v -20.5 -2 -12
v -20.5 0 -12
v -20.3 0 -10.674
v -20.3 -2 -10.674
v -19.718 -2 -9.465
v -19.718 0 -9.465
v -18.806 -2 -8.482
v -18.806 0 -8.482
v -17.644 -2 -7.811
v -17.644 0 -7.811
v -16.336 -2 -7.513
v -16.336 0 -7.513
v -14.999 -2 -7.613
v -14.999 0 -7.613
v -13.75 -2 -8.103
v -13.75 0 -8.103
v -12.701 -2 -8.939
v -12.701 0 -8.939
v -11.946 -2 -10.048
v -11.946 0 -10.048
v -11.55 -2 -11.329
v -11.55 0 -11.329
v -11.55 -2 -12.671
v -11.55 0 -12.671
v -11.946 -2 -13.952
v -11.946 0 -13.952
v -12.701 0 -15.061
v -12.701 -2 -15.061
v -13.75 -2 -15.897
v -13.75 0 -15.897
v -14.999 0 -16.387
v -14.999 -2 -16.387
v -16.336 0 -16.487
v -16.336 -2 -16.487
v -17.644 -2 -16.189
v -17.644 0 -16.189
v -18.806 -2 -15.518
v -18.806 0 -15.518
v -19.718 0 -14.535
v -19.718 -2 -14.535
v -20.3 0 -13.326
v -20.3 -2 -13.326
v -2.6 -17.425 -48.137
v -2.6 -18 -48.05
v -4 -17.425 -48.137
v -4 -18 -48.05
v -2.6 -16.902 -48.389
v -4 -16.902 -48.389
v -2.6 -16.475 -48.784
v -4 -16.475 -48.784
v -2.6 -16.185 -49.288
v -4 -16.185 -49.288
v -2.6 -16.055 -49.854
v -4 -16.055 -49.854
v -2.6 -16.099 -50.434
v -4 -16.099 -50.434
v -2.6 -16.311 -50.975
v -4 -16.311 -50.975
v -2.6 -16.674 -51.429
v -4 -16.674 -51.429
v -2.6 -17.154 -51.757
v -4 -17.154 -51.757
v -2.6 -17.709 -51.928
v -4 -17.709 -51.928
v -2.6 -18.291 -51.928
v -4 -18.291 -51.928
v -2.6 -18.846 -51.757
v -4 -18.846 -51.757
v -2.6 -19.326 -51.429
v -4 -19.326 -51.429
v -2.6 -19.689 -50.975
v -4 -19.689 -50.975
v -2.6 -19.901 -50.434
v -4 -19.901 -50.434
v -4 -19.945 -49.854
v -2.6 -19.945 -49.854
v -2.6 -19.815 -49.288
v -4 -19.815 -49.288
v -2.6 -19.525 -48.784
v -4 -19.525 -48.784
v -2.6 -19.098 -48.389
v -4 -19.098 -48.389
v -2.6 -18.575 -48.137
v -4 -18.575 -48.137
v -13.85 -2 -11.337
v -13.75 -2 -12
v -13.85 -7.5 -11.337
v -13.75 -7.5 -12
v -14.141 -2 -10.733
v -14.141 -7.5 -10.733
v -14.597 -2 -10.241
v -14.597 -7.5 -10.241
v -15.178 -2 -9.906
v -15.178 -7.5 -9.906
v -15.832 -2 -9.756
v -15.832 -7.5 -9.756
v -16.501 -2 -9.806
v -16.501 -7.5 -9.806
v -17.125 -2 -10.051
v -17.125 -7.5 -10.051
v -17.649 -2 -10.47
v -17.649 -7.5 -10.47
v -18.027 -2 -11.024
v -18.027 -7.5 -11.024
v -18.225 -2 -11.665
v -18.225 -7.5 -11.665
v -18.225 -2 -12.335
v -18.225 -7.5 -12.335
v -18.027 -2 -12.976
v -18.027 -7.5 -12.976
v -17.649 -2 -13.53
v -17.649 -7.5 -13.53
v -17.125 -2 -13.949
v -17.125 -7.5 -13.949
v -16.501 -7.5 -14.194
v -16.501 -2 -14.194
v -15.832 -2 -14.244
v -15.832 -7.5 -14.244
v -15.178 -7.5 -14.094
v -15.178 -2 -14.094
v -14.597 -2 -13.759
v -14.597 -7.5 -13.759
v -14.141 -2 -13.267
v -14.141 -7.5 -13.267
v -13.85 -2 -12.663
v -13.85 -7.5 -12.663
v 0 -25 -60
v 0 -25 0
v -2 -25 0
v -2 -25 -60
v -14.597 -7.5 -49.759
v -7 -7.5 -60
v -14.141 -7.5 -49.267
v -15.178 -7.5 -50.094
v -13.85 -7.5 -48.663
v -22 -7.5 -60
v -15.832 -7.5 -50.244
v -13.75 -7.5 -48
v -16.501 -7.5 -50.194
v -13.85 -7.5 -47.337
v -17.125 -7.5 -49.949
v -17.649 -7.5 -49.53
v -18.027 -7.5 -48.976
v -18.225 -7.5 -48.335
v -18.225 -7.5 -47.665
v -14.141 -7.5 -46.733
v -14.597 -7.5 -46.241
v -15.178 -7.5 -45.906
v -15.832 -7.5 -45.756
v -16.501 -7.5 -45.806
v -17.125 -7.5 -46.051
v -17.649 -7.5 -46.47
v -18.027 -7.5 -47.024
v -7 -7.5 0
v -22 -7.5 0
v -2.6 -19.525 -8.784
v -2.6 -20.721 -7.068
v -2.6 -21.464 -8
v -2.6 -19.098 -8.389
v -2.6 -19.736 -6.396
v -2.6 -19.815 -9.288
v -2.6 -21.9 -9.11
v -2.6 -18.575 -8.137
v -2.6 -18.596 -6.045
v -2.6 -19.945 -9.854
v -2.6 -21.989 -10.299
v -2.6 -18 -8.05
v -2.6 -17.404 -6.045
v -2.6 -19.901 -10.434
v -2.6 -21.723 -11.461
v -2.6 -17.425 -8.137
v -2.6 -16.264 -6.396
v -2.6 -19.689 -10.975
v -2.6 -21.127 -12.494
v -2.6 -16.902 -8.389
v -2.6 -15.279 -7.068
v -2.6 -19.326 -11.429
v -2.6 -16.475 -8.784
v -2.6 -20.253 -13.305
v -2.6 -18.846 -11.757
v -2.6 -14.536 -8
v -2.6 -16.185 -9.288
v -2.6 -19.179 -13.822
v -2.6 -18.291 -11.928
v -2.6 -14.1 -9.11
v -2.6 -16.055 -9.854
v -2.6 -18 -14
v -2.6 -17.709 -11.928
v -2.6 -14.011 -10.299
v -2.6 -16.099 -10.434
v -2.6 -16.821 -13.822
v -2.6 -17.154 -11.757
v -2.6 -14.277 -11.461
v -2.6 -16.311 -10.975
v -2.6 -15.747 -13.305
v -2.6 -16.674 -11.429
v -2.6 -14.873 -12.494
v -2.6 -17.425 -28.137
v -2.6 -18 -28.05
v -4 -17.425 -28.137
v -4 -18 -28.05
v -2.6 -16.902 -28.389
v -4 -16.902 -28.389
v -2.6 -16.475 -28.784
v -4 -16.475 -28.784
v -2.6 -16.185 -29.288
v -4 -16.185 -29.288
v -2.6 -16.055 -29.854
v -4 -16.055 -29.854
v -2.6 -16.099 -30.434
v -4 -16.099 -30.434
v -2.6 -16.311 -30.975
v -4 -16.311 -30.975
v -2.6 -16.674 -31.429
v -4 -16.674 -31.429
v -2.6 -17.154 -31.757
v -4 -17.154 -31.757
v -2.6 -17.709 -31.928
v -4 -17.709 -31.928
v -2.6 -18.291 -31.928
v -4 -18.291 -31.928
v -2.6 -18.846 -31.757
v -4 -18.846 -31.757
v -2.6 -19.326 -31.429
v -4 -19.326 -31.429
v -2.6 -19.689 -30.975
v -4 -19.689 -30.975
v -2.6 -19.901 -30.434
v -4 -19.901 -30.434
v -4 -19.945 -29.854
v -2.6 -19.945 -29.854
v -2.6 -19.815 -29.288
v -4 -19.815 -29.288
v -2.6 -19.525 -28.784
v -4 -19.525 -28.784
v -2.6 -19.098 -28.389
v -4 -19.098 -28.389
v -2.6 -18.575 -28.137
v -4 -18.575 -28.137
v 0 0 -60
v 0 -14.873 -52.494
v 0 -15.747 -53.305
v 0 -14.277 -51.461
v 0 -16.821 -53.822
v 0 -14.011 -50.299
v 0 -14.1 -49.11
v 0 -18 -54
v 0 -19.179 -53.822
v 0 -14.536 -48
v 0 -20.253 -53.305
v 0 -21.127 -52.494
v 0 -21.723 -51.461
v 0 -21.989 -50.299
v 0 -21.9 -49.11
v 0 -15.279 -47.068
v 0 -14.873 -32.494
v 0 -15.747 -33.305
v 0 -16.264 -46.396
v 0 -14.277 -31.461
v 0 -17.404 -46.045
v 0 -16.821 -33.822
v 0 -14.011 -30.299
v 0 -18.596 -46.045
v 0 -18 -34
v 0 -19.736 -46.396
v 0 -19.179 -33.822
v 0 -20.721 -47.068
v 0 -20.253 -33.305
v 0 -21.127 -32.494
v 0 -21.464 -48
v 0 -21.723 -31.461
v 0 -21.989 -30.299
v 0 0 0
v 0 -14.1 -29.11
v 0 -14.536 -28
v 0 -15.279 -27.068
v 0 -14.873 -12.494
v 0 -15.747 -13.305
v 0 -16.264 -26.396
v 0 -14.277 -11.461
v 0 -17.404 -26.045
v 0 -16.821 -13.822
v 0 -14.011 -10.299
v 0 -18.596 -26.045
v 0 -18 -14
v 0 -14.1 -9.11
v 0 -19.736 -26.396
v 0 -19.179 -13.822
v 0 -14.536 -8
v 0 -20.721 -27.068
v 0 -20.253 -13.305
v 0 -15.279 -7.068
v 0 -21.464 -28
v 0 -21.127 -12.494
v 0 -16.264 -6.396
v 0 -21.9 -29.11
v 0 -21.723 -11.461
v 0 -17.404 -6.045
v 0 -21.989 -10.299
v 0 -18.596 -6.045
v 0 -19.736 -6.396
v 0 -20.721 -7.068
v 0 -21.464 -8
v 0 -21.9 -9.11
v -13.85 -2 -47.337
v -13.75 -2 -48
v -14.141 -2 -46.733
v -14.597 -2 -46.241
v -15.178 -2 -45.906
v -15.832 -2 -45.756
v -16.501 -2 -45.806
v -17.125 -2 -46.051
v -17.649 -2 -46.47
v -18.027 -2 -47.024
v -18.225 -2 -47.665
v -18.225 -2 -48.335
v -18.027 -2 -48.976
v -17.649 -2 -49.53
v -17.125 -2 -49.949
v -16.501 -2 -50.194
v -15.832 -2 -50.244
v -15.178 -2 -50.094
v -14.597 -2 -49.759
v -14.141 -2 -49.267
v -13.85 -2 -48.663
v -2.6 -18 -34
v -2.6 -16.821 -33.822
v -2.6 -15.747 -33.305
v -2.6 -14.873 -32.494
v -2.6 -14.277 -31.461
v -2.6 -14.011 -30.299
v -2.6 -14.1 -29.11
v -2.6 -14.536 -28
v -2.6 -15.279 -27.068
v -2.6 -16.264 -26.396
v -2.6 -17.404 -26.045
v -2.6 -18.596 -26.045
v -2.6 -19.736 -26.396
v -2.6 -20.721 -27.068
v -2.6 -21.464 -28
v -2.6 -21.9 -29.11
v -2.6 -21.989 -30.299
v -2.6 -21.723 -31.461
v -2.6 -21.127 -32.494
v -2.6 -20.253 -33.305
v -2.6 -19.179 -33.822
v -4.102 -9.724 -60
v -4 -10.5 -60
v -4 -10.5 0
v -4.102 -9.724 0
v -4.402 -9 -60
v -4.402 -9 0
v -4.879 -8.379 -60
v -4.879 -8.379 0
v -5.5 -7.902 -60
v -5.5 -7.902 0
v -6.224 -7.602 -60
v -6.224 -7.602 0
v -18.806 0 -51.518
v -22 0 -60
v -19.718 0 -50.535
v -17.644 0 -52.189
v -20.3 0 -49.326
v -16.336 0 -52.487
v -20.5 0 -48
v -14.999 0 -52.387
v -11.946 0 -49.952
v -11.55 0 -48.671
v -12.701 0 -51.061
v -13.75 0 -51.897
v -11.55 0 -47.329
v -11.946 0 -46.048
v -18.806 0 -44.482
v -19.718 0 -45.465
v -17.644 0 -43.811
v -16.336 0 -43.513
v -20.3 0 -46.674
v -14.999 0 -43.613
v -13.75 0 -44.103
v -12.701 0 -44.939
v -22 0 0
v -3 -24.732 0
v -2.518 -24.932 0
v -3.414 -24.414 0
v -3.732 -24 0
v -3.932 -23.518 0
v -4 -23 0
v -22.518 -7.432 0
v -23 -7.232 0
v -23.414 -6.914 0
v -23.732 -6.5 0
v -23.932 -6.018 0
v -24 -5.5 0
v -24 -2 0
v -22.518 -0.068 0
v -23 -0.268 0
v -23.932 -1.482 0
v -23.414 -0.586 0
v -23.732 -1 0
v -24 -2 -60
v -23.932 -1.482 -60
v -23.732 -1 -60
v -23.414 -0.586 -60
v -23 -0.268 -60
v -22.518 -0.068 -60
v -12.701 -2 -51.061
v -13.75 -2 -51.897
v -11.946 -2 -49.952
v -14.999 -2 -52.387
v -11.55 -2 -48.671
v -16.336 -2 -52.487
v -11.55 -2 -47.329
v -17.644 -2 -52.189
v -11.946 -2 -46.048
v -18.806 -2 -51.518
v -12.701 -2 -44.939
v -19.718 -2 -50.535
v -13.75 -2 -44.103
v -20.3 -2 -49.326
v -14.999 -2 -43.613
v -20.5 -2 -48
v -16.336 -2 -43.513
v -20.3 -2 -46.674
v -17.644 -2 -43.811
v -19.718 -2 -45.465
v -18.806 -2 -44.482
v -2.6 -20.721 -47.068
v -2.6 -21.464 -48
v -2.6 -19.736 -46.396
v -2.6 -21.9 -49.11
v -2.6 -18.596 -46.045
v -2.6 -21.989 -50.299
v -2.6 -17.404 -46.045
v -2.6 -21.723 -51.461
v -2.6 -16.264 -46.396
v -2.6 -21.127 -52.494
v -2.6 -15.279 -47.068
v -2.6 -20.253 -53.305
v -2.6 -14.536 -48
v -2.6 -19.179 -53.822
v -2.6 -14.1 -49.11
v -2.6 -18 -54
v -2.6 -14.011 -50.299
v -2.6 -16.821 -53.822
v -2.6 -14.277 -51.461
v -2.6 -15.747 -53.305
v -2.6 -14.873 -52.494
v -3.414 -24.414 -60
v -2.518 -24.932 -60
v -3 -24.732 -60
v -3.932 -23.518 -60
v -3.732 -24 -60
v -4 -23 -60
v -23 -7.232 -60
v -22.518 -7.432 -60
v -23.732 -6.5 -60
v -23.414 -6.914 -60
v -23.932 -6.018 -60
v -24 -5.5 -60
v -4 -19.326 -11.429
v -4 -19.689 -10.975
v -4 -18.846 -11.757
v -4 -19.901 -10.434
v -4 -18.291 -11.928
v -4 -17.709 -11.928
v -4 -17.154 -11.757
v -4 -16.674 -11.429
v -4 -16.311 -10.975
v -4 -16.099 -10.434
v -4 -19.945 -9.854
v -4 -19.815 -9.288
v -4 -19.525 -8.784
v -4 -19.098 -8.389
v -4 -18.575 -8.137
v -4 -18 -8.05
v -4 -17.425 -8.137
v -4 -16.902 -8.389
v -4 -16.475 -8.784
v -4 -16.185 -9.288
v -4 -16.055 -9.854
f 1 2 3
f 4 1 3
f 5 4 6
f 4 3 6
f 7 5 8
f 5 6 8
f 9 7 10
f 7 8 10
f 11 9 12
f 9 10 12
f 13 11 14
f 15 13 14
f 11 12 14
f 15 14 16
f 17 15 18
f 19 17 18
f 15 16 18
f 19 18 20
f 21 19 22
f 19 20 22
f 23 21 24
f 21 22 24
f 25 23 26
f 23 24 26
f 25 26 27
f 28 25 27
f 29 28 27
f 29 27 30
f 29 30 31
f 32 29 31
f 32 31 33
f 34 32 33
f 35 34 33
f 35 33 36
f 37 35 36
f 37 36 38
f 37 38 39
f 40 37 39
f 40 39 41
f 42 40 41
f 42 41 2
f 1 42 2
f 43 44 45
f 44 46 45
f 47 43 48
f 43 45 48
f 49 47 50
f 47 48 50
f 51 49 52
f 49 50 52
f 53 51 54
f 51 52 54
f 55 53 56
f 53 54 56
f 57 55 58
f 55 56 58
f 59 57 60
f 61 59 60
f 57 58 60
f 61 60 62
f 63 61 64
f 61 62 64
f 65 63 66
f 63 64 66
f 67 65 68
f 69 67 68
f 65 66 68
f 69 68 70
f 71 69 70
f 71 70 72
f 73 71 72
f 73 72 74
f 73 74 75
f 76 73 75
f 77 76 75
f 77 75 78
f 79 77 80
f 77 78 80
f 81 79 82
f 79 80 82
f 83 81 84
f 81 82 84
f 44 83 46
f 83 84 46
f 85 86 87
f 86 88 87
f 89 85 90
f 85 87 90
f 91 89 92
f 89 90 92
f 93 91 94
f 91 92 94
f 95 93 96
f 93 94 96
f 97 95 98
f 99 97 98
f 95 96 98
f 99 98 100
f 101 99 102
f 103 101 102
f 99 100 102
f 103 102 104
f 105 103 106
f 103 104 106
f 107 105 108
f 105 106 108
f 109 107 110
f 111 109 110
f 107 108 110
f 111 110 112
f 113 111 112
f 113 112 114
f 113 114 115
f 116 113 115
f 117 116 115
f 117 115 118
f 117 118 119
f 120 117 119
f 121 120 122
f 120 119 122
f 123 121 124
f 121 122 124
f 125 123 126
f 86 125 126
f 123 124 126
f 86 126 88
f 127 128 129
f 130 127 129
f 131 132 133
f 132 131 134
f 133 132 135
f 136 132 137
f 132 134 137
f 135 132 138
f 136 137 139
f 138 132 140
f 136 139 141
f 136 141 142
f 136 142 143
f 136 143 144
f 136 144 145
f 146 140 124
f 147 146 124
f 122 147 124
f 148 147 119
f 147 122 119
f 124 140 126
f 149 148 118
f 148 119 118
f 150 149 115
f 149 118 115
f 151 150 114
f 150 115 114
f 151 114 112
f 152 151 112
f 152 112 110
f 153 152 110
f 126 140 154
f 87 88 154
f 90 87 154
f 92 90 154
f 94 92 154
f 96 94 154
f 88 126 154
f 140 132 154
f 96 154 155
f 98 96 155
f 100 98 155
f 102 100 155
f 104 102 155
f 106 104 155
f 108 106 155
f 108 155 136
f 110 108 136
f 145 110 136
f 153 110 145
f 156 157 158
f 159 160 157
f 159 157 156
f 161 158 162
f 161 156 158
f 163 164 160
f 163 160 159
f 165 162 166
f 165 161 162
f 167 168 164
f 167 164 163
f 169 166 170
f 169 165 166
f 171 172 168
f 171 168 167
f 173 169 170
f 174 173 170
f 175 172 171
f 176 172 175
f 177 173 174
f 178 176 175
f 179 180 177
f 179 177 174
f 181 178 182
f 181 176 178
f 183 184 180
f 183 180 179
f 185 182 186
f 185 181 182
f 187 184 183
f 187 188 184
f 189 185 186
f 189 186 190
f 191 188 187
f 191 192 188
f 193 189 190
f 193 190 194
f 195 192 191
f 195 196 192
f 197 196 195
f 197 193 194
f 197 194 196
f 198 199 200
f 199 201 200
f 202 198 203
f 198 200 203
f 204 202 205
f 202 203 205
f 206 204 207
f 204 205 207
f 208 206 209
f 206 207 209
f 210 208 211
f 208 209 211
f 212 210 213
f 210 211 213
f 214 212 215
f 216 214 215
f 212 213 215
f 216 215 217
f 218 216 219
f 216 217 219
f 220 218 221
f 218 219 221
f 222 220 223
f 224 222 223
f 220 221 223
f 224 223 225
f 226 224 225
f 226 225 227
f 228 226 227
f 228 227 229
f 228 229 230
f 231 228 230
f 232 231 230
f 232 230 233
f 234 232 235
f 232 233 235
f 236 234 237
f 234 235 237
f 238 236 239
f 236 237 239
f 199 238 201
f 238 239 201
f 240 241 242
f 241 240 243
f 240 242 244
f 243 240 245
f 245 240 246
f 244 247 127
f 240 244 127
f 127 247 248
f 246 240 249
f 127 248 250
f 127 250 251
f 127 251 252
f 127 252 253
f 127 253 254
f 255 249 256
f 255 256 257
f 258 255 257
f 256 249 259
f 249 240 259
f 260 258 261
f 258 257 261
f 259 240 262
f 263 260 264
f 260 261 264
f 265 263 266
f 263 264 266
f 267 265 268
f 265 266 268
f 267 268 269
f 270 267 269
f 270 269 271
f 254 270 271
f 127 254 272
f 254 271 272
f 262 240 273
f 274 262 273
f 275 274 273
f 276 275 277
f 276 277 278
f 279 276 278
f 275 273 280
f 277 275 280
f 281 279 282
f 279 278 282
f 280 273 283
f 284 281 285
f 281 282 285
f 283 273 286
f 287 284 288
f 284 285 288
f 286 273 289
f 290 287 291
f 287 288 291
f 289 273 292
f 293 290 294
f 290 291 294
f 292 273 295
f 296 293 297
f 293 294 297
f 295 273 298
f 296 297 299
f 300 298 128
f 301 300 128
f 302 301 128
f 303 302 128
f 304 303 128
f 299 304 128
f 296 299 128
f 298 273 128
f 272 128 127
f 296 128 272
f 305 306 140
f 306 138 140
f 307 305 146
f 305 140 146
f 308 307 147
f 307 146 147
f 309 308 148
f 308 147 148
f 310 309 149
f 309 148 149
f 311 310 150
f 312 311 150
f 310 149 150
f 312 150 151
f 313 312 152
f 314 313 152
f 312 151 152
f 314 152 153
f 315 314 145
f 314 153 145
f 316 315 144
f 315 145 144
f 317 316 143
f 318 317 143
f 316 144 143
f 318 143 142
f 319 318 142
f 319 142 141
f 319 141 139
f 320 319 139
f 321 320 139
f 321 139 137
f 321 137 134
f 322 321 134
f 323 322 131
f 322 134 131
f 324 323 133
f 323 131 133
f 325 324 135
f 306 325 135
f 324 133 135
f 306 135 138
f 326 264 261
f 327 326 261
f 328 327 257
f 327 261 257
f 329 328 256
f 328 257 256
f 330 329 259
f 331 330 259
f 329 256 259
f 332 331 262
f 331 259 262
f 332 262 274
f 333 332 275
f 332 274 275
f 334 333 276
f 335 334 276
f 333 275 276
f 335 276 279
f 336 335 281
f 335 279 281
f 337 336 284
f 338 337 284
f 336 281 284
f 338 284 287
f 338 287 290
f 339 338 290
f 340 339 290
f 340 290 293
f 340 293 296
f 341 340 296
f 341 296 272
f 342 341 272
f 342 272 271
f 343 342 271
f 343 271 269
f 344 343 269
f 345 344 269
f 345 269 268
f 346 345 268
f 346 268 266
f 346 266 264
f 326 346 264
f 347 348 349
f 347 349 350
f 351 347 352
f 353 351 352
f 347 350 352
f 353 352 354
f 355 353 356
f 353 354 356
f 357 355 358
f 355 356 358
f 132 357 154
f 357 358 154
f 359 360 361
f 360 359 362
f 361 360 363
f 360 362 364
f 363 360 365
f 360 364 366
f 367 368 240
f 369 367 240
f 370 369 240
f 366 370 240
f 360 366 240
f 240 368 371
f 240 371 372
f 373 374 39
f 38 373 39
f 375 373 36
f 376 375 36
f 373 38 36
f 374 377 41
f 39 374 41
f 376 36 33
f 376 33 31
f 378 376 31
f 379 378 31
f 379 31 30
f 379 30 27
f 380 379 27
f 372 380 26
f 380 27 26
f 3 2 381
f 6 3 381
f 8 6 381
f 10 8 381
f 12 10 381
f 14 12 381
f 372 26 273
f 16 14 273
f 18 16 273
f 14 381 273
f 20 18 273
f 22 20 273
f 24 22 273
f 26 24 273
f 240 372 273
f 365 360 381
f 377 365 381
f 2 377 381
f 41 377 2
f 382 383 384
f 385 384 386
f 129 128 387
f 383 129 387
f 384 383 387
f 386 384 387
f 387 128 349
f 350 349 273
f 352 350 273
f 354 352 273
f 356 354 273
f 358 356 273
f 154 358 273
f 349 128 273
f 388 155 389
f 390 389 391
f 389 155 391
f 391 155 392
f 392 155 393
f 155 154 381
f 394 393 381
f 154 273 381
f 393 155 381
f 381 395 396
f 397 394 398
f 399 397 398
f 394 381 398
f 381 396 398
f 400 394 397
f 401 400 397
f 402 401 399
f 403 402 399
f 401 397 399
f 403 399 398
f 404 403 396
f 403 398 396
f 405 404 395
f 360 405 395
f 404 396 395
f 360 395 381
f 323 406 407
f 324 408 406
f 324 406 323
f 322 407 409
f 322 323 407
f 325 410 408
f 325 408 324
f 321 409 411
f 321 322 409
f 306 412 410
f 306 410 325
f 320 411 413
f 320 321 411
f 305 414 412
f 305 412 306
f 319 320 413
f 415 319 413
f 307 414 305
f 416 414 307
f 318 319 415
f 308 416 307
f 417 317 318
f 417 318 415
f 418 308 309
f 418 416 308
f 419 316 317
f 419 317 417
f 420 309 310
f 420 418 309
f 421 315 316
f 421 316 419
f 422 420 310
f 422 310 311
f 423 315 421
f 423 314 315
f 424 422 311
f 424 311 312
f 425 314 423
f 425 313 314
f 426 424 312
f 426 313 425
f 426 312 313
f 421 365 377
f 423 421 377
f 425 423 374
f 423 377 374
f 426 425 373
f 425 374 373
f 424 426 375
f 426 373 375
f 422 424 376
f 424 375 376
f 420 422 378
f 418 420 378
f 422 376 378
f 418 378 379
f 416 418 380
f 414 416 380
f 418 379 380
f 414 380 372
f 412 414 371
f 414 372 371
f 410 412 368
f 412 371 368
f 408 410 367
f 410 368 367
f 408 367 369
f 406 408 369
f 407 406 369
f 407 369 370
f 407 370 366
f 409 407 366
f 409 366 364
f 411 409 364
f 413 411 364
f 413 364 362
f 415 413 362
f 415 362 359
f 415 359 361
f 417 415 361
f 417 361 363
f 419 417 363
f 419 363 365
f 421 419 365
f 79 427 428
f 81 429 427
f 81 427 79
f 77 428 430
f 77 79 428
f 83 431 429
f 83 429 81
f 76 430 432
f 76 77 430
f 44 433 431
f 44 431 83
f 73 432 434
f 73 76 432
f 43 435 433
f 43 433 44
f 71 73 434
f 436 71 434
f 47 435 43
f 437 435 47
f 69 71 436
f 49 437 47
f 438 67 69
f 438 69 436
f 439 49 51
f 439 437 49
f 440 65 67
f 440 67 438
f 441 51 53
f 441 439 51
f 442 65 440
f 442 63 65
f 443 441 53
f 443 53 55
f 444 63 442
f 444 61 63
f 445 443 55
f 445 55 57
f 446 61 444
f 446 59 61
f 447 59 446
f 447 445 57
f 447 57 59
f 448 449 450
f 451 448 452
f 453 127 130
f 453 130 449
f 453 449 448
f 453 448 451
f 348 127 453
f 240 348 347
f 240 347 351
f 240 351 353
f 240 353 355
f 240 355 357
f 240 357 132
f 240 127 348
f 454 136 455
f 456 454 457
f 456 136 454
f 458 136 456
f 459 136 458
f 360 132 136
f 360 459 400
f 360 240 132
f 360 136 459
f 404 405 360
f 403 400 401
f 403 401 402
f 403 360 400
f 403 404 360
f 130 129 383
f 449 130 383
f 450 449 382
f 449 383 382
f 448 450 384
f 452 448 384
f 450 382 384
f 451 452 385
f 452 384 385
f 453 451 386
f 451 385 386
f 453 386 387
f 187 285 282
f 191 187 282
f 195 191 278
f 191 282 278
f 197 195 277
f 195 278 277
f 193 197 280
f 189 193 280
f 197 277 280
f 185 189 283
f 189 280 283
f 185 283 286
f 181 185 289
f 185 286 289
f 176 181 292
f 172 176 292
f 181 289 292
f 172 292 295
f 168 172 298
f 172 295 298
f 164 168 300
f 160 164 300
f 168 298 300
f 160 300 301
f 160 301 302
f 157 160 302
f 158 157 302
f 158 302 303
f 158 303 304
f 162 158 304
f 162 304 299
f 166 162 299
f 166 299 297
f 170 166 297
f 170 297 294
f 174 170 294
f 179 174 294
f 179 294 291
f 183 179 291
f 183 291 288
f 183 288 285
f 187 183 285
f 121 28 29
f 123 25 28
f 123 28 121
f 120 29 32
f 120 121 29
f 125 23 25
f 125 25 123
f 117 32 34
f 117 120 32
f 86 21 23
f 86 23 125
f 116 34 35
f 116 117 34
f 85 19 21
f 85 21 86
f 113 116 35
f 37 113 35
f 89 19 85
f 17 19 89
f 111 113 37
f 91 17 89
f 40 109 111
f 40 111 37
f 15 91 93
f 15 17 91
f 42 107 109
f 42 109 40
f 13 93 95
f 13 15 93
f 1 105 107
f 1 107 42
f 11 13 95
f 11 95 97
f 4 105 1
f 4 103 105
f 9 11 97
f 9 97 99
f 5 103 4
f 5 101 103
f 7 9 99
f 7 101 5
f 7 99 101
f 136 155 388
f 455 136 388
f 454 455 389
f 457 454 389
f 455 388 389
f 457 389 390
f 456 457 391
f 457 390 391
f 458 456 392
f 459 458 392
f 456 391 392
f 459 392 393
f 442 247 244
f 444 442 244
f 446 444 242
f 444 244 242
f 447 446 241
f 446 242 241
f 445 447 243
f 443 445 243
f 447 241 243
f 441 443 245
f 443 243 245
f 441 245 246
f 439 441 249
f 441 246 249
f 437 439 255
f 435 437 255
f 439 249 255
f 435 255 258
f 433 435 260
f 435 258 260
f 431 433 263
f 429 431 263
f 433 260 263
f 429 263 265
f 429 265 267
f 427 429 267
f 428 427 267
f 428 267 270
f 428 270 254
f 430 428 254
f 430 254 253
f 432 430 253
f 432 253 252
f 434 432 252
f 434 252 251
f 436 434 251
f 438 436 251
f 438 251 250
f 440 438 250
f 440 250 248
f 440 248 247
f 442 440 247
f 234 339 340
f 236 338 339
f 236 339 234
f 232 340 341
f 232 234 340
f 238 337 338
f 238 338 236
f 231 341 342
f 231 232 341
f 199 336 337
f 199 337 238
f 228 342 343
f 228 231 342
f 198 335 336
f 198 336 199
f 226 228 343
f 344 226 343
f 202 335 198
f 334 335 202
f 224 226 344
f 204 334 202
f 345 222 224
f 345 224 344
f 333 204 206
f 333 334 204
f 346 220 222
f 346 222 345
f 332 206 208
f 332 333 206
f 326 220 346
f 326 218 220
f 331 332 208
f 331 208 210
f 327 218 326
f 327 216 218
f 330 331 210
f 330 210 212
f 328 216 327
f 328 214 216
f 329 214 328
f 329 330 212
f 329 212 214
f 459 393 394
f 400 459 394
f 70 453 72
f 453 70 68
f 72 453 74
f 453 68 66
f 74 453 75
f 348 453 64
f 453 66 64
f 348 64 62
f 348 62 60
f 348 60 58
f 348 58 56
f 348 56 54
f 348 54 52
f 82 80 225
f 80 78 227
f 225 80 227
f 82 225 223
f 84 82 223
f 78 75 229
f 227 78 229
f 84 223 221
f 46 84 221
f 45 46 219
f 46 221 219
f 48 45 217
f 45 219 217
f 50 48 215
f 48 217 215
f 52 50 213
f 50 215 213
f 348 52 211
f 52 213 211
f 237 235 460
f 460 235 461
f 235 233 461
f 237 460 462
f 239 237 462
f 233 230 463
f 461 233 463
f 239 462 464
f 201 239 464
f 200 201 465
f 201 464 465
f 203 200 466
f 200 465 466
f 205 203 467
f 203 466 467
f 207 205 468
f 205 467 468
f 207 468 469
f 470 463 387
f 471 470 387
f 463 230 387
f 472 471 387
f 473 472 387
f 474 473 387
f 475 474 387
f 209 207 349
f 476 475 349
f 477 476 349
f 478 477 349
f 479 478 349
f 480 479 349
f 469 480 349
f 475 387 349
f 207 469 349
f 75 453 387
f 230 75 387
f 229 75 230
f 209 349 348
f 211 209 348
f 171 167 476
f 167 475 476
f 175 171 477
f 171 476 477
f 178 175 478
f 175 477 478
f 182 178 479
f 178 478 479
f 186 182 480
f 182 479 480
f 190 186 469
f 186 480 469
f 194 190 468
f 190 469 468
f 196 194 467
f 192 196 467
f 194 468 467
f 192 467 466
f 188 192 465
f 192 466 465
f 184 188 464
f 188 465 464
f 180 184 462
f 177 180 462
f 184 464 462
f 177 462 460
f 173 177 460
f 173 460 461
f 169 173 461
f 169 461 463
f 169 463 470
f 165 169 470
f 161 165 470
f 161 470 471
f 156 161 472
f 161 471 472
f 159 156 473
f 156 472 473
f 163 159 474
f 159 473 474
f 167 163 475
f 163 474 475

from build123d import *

# Parameters (mm, degrees)
EXTRUDE1_DEPTH                                     = 60
CBORE_FOR_M3_5_PAN_HEAD_MACHINE_SCREW1_D           = 3.9
CBORE_FOR_M3_5_PAN_HEAD_MACHINE_SCREW1_CBORE_D     = 8
CBORE_FOR_M3_5_PAN_HEAD_MACHINE_SCREW1_CBORE_DEPTH = 2.6
CBORE_FOR_M4_PAN_HEAD_MACHINE_SCREW1_D             = 4.5
CBORE_FOR_M4_PAN_HEAD_MACHINE_SCREW1_CBORE_D       = 9
CBORE_FOR_M4_PAN_HEAD_MACHINE_SCREW1_CBORE_DEPTH   = 2


with BuildPart() as part:
    # Sketch1 → Extrude1 (new body)
    with BuildSketch(Plane.XY):
        with BuildLine():
            Line((-22, 0), (0, 0))
            Line((0, 0), (0, -25))
            Line((0, -25), (-2, -25))
            ThreePointArc((-2, -25), (-3.414213562, -24.414213562), (-4, -23))
            Line((-4, -23), (-4, -10.5))
            ThreePointArc((-4, -10.5), (-4.878679656, -8.378679656), (-7, -7.5))
            Line((-7, -7.5), (-22, -7.5))
            ThreePointArc((-22, -7.5), (-23.414213562, -6.914213562), (-24, -5.5))
            Line((-24, -5.5), (-24, -2))
            ThreePointArc((-24, -2), (-23.414213562, -0.585786438), (-22, 0))
        make_face()
    extrude(amount=-EXTRUDE1_DEPTH)

    # CBORE for M3.5 Pan Head Machine Screw1 (through all)
    with Locations(Plane(origin=(0, 0, 0), x_dir=(0, 0, -1), z_dir=(1, 0, 0))):
        with Locations((50, -18), (30, -18), (10, -18)):
            CounterBoreHole(CBORE_FOR_M3_5_PAN_HEAD_MACHINE_SCREW1_D / 2, CBORE_FOR_M3_5_PAN_HEAD_MACHINE_SCREW1_CBORE_D / 2, CBORE_FOR_M3_5_PAN_HEAD_MACHINE_SCREW1_CBORE_DEPTH)

    # CBORE for M4 Pan Head Machine Screw1 (through all)
    with Locations(Plane(origin=(0, 0, 0), x_dir=(-1, 0, 0), z_dir=(0, 1, 0))):
        with Locations((16, -48), (16, -12)):
            CounterBoreHole(CBORE_FOR_M4_PAN_HEAD_MACHINE_SCREW1_D / 2, CBORE_FOR_M4_PAN_HEAD_MACHINE_SCREW1_CBORE_D / 2, CBORE_FOR_M4_PAN_HEAD_MACHINE_SCREW1_CBORE_DEPTH)


solid = part.part
